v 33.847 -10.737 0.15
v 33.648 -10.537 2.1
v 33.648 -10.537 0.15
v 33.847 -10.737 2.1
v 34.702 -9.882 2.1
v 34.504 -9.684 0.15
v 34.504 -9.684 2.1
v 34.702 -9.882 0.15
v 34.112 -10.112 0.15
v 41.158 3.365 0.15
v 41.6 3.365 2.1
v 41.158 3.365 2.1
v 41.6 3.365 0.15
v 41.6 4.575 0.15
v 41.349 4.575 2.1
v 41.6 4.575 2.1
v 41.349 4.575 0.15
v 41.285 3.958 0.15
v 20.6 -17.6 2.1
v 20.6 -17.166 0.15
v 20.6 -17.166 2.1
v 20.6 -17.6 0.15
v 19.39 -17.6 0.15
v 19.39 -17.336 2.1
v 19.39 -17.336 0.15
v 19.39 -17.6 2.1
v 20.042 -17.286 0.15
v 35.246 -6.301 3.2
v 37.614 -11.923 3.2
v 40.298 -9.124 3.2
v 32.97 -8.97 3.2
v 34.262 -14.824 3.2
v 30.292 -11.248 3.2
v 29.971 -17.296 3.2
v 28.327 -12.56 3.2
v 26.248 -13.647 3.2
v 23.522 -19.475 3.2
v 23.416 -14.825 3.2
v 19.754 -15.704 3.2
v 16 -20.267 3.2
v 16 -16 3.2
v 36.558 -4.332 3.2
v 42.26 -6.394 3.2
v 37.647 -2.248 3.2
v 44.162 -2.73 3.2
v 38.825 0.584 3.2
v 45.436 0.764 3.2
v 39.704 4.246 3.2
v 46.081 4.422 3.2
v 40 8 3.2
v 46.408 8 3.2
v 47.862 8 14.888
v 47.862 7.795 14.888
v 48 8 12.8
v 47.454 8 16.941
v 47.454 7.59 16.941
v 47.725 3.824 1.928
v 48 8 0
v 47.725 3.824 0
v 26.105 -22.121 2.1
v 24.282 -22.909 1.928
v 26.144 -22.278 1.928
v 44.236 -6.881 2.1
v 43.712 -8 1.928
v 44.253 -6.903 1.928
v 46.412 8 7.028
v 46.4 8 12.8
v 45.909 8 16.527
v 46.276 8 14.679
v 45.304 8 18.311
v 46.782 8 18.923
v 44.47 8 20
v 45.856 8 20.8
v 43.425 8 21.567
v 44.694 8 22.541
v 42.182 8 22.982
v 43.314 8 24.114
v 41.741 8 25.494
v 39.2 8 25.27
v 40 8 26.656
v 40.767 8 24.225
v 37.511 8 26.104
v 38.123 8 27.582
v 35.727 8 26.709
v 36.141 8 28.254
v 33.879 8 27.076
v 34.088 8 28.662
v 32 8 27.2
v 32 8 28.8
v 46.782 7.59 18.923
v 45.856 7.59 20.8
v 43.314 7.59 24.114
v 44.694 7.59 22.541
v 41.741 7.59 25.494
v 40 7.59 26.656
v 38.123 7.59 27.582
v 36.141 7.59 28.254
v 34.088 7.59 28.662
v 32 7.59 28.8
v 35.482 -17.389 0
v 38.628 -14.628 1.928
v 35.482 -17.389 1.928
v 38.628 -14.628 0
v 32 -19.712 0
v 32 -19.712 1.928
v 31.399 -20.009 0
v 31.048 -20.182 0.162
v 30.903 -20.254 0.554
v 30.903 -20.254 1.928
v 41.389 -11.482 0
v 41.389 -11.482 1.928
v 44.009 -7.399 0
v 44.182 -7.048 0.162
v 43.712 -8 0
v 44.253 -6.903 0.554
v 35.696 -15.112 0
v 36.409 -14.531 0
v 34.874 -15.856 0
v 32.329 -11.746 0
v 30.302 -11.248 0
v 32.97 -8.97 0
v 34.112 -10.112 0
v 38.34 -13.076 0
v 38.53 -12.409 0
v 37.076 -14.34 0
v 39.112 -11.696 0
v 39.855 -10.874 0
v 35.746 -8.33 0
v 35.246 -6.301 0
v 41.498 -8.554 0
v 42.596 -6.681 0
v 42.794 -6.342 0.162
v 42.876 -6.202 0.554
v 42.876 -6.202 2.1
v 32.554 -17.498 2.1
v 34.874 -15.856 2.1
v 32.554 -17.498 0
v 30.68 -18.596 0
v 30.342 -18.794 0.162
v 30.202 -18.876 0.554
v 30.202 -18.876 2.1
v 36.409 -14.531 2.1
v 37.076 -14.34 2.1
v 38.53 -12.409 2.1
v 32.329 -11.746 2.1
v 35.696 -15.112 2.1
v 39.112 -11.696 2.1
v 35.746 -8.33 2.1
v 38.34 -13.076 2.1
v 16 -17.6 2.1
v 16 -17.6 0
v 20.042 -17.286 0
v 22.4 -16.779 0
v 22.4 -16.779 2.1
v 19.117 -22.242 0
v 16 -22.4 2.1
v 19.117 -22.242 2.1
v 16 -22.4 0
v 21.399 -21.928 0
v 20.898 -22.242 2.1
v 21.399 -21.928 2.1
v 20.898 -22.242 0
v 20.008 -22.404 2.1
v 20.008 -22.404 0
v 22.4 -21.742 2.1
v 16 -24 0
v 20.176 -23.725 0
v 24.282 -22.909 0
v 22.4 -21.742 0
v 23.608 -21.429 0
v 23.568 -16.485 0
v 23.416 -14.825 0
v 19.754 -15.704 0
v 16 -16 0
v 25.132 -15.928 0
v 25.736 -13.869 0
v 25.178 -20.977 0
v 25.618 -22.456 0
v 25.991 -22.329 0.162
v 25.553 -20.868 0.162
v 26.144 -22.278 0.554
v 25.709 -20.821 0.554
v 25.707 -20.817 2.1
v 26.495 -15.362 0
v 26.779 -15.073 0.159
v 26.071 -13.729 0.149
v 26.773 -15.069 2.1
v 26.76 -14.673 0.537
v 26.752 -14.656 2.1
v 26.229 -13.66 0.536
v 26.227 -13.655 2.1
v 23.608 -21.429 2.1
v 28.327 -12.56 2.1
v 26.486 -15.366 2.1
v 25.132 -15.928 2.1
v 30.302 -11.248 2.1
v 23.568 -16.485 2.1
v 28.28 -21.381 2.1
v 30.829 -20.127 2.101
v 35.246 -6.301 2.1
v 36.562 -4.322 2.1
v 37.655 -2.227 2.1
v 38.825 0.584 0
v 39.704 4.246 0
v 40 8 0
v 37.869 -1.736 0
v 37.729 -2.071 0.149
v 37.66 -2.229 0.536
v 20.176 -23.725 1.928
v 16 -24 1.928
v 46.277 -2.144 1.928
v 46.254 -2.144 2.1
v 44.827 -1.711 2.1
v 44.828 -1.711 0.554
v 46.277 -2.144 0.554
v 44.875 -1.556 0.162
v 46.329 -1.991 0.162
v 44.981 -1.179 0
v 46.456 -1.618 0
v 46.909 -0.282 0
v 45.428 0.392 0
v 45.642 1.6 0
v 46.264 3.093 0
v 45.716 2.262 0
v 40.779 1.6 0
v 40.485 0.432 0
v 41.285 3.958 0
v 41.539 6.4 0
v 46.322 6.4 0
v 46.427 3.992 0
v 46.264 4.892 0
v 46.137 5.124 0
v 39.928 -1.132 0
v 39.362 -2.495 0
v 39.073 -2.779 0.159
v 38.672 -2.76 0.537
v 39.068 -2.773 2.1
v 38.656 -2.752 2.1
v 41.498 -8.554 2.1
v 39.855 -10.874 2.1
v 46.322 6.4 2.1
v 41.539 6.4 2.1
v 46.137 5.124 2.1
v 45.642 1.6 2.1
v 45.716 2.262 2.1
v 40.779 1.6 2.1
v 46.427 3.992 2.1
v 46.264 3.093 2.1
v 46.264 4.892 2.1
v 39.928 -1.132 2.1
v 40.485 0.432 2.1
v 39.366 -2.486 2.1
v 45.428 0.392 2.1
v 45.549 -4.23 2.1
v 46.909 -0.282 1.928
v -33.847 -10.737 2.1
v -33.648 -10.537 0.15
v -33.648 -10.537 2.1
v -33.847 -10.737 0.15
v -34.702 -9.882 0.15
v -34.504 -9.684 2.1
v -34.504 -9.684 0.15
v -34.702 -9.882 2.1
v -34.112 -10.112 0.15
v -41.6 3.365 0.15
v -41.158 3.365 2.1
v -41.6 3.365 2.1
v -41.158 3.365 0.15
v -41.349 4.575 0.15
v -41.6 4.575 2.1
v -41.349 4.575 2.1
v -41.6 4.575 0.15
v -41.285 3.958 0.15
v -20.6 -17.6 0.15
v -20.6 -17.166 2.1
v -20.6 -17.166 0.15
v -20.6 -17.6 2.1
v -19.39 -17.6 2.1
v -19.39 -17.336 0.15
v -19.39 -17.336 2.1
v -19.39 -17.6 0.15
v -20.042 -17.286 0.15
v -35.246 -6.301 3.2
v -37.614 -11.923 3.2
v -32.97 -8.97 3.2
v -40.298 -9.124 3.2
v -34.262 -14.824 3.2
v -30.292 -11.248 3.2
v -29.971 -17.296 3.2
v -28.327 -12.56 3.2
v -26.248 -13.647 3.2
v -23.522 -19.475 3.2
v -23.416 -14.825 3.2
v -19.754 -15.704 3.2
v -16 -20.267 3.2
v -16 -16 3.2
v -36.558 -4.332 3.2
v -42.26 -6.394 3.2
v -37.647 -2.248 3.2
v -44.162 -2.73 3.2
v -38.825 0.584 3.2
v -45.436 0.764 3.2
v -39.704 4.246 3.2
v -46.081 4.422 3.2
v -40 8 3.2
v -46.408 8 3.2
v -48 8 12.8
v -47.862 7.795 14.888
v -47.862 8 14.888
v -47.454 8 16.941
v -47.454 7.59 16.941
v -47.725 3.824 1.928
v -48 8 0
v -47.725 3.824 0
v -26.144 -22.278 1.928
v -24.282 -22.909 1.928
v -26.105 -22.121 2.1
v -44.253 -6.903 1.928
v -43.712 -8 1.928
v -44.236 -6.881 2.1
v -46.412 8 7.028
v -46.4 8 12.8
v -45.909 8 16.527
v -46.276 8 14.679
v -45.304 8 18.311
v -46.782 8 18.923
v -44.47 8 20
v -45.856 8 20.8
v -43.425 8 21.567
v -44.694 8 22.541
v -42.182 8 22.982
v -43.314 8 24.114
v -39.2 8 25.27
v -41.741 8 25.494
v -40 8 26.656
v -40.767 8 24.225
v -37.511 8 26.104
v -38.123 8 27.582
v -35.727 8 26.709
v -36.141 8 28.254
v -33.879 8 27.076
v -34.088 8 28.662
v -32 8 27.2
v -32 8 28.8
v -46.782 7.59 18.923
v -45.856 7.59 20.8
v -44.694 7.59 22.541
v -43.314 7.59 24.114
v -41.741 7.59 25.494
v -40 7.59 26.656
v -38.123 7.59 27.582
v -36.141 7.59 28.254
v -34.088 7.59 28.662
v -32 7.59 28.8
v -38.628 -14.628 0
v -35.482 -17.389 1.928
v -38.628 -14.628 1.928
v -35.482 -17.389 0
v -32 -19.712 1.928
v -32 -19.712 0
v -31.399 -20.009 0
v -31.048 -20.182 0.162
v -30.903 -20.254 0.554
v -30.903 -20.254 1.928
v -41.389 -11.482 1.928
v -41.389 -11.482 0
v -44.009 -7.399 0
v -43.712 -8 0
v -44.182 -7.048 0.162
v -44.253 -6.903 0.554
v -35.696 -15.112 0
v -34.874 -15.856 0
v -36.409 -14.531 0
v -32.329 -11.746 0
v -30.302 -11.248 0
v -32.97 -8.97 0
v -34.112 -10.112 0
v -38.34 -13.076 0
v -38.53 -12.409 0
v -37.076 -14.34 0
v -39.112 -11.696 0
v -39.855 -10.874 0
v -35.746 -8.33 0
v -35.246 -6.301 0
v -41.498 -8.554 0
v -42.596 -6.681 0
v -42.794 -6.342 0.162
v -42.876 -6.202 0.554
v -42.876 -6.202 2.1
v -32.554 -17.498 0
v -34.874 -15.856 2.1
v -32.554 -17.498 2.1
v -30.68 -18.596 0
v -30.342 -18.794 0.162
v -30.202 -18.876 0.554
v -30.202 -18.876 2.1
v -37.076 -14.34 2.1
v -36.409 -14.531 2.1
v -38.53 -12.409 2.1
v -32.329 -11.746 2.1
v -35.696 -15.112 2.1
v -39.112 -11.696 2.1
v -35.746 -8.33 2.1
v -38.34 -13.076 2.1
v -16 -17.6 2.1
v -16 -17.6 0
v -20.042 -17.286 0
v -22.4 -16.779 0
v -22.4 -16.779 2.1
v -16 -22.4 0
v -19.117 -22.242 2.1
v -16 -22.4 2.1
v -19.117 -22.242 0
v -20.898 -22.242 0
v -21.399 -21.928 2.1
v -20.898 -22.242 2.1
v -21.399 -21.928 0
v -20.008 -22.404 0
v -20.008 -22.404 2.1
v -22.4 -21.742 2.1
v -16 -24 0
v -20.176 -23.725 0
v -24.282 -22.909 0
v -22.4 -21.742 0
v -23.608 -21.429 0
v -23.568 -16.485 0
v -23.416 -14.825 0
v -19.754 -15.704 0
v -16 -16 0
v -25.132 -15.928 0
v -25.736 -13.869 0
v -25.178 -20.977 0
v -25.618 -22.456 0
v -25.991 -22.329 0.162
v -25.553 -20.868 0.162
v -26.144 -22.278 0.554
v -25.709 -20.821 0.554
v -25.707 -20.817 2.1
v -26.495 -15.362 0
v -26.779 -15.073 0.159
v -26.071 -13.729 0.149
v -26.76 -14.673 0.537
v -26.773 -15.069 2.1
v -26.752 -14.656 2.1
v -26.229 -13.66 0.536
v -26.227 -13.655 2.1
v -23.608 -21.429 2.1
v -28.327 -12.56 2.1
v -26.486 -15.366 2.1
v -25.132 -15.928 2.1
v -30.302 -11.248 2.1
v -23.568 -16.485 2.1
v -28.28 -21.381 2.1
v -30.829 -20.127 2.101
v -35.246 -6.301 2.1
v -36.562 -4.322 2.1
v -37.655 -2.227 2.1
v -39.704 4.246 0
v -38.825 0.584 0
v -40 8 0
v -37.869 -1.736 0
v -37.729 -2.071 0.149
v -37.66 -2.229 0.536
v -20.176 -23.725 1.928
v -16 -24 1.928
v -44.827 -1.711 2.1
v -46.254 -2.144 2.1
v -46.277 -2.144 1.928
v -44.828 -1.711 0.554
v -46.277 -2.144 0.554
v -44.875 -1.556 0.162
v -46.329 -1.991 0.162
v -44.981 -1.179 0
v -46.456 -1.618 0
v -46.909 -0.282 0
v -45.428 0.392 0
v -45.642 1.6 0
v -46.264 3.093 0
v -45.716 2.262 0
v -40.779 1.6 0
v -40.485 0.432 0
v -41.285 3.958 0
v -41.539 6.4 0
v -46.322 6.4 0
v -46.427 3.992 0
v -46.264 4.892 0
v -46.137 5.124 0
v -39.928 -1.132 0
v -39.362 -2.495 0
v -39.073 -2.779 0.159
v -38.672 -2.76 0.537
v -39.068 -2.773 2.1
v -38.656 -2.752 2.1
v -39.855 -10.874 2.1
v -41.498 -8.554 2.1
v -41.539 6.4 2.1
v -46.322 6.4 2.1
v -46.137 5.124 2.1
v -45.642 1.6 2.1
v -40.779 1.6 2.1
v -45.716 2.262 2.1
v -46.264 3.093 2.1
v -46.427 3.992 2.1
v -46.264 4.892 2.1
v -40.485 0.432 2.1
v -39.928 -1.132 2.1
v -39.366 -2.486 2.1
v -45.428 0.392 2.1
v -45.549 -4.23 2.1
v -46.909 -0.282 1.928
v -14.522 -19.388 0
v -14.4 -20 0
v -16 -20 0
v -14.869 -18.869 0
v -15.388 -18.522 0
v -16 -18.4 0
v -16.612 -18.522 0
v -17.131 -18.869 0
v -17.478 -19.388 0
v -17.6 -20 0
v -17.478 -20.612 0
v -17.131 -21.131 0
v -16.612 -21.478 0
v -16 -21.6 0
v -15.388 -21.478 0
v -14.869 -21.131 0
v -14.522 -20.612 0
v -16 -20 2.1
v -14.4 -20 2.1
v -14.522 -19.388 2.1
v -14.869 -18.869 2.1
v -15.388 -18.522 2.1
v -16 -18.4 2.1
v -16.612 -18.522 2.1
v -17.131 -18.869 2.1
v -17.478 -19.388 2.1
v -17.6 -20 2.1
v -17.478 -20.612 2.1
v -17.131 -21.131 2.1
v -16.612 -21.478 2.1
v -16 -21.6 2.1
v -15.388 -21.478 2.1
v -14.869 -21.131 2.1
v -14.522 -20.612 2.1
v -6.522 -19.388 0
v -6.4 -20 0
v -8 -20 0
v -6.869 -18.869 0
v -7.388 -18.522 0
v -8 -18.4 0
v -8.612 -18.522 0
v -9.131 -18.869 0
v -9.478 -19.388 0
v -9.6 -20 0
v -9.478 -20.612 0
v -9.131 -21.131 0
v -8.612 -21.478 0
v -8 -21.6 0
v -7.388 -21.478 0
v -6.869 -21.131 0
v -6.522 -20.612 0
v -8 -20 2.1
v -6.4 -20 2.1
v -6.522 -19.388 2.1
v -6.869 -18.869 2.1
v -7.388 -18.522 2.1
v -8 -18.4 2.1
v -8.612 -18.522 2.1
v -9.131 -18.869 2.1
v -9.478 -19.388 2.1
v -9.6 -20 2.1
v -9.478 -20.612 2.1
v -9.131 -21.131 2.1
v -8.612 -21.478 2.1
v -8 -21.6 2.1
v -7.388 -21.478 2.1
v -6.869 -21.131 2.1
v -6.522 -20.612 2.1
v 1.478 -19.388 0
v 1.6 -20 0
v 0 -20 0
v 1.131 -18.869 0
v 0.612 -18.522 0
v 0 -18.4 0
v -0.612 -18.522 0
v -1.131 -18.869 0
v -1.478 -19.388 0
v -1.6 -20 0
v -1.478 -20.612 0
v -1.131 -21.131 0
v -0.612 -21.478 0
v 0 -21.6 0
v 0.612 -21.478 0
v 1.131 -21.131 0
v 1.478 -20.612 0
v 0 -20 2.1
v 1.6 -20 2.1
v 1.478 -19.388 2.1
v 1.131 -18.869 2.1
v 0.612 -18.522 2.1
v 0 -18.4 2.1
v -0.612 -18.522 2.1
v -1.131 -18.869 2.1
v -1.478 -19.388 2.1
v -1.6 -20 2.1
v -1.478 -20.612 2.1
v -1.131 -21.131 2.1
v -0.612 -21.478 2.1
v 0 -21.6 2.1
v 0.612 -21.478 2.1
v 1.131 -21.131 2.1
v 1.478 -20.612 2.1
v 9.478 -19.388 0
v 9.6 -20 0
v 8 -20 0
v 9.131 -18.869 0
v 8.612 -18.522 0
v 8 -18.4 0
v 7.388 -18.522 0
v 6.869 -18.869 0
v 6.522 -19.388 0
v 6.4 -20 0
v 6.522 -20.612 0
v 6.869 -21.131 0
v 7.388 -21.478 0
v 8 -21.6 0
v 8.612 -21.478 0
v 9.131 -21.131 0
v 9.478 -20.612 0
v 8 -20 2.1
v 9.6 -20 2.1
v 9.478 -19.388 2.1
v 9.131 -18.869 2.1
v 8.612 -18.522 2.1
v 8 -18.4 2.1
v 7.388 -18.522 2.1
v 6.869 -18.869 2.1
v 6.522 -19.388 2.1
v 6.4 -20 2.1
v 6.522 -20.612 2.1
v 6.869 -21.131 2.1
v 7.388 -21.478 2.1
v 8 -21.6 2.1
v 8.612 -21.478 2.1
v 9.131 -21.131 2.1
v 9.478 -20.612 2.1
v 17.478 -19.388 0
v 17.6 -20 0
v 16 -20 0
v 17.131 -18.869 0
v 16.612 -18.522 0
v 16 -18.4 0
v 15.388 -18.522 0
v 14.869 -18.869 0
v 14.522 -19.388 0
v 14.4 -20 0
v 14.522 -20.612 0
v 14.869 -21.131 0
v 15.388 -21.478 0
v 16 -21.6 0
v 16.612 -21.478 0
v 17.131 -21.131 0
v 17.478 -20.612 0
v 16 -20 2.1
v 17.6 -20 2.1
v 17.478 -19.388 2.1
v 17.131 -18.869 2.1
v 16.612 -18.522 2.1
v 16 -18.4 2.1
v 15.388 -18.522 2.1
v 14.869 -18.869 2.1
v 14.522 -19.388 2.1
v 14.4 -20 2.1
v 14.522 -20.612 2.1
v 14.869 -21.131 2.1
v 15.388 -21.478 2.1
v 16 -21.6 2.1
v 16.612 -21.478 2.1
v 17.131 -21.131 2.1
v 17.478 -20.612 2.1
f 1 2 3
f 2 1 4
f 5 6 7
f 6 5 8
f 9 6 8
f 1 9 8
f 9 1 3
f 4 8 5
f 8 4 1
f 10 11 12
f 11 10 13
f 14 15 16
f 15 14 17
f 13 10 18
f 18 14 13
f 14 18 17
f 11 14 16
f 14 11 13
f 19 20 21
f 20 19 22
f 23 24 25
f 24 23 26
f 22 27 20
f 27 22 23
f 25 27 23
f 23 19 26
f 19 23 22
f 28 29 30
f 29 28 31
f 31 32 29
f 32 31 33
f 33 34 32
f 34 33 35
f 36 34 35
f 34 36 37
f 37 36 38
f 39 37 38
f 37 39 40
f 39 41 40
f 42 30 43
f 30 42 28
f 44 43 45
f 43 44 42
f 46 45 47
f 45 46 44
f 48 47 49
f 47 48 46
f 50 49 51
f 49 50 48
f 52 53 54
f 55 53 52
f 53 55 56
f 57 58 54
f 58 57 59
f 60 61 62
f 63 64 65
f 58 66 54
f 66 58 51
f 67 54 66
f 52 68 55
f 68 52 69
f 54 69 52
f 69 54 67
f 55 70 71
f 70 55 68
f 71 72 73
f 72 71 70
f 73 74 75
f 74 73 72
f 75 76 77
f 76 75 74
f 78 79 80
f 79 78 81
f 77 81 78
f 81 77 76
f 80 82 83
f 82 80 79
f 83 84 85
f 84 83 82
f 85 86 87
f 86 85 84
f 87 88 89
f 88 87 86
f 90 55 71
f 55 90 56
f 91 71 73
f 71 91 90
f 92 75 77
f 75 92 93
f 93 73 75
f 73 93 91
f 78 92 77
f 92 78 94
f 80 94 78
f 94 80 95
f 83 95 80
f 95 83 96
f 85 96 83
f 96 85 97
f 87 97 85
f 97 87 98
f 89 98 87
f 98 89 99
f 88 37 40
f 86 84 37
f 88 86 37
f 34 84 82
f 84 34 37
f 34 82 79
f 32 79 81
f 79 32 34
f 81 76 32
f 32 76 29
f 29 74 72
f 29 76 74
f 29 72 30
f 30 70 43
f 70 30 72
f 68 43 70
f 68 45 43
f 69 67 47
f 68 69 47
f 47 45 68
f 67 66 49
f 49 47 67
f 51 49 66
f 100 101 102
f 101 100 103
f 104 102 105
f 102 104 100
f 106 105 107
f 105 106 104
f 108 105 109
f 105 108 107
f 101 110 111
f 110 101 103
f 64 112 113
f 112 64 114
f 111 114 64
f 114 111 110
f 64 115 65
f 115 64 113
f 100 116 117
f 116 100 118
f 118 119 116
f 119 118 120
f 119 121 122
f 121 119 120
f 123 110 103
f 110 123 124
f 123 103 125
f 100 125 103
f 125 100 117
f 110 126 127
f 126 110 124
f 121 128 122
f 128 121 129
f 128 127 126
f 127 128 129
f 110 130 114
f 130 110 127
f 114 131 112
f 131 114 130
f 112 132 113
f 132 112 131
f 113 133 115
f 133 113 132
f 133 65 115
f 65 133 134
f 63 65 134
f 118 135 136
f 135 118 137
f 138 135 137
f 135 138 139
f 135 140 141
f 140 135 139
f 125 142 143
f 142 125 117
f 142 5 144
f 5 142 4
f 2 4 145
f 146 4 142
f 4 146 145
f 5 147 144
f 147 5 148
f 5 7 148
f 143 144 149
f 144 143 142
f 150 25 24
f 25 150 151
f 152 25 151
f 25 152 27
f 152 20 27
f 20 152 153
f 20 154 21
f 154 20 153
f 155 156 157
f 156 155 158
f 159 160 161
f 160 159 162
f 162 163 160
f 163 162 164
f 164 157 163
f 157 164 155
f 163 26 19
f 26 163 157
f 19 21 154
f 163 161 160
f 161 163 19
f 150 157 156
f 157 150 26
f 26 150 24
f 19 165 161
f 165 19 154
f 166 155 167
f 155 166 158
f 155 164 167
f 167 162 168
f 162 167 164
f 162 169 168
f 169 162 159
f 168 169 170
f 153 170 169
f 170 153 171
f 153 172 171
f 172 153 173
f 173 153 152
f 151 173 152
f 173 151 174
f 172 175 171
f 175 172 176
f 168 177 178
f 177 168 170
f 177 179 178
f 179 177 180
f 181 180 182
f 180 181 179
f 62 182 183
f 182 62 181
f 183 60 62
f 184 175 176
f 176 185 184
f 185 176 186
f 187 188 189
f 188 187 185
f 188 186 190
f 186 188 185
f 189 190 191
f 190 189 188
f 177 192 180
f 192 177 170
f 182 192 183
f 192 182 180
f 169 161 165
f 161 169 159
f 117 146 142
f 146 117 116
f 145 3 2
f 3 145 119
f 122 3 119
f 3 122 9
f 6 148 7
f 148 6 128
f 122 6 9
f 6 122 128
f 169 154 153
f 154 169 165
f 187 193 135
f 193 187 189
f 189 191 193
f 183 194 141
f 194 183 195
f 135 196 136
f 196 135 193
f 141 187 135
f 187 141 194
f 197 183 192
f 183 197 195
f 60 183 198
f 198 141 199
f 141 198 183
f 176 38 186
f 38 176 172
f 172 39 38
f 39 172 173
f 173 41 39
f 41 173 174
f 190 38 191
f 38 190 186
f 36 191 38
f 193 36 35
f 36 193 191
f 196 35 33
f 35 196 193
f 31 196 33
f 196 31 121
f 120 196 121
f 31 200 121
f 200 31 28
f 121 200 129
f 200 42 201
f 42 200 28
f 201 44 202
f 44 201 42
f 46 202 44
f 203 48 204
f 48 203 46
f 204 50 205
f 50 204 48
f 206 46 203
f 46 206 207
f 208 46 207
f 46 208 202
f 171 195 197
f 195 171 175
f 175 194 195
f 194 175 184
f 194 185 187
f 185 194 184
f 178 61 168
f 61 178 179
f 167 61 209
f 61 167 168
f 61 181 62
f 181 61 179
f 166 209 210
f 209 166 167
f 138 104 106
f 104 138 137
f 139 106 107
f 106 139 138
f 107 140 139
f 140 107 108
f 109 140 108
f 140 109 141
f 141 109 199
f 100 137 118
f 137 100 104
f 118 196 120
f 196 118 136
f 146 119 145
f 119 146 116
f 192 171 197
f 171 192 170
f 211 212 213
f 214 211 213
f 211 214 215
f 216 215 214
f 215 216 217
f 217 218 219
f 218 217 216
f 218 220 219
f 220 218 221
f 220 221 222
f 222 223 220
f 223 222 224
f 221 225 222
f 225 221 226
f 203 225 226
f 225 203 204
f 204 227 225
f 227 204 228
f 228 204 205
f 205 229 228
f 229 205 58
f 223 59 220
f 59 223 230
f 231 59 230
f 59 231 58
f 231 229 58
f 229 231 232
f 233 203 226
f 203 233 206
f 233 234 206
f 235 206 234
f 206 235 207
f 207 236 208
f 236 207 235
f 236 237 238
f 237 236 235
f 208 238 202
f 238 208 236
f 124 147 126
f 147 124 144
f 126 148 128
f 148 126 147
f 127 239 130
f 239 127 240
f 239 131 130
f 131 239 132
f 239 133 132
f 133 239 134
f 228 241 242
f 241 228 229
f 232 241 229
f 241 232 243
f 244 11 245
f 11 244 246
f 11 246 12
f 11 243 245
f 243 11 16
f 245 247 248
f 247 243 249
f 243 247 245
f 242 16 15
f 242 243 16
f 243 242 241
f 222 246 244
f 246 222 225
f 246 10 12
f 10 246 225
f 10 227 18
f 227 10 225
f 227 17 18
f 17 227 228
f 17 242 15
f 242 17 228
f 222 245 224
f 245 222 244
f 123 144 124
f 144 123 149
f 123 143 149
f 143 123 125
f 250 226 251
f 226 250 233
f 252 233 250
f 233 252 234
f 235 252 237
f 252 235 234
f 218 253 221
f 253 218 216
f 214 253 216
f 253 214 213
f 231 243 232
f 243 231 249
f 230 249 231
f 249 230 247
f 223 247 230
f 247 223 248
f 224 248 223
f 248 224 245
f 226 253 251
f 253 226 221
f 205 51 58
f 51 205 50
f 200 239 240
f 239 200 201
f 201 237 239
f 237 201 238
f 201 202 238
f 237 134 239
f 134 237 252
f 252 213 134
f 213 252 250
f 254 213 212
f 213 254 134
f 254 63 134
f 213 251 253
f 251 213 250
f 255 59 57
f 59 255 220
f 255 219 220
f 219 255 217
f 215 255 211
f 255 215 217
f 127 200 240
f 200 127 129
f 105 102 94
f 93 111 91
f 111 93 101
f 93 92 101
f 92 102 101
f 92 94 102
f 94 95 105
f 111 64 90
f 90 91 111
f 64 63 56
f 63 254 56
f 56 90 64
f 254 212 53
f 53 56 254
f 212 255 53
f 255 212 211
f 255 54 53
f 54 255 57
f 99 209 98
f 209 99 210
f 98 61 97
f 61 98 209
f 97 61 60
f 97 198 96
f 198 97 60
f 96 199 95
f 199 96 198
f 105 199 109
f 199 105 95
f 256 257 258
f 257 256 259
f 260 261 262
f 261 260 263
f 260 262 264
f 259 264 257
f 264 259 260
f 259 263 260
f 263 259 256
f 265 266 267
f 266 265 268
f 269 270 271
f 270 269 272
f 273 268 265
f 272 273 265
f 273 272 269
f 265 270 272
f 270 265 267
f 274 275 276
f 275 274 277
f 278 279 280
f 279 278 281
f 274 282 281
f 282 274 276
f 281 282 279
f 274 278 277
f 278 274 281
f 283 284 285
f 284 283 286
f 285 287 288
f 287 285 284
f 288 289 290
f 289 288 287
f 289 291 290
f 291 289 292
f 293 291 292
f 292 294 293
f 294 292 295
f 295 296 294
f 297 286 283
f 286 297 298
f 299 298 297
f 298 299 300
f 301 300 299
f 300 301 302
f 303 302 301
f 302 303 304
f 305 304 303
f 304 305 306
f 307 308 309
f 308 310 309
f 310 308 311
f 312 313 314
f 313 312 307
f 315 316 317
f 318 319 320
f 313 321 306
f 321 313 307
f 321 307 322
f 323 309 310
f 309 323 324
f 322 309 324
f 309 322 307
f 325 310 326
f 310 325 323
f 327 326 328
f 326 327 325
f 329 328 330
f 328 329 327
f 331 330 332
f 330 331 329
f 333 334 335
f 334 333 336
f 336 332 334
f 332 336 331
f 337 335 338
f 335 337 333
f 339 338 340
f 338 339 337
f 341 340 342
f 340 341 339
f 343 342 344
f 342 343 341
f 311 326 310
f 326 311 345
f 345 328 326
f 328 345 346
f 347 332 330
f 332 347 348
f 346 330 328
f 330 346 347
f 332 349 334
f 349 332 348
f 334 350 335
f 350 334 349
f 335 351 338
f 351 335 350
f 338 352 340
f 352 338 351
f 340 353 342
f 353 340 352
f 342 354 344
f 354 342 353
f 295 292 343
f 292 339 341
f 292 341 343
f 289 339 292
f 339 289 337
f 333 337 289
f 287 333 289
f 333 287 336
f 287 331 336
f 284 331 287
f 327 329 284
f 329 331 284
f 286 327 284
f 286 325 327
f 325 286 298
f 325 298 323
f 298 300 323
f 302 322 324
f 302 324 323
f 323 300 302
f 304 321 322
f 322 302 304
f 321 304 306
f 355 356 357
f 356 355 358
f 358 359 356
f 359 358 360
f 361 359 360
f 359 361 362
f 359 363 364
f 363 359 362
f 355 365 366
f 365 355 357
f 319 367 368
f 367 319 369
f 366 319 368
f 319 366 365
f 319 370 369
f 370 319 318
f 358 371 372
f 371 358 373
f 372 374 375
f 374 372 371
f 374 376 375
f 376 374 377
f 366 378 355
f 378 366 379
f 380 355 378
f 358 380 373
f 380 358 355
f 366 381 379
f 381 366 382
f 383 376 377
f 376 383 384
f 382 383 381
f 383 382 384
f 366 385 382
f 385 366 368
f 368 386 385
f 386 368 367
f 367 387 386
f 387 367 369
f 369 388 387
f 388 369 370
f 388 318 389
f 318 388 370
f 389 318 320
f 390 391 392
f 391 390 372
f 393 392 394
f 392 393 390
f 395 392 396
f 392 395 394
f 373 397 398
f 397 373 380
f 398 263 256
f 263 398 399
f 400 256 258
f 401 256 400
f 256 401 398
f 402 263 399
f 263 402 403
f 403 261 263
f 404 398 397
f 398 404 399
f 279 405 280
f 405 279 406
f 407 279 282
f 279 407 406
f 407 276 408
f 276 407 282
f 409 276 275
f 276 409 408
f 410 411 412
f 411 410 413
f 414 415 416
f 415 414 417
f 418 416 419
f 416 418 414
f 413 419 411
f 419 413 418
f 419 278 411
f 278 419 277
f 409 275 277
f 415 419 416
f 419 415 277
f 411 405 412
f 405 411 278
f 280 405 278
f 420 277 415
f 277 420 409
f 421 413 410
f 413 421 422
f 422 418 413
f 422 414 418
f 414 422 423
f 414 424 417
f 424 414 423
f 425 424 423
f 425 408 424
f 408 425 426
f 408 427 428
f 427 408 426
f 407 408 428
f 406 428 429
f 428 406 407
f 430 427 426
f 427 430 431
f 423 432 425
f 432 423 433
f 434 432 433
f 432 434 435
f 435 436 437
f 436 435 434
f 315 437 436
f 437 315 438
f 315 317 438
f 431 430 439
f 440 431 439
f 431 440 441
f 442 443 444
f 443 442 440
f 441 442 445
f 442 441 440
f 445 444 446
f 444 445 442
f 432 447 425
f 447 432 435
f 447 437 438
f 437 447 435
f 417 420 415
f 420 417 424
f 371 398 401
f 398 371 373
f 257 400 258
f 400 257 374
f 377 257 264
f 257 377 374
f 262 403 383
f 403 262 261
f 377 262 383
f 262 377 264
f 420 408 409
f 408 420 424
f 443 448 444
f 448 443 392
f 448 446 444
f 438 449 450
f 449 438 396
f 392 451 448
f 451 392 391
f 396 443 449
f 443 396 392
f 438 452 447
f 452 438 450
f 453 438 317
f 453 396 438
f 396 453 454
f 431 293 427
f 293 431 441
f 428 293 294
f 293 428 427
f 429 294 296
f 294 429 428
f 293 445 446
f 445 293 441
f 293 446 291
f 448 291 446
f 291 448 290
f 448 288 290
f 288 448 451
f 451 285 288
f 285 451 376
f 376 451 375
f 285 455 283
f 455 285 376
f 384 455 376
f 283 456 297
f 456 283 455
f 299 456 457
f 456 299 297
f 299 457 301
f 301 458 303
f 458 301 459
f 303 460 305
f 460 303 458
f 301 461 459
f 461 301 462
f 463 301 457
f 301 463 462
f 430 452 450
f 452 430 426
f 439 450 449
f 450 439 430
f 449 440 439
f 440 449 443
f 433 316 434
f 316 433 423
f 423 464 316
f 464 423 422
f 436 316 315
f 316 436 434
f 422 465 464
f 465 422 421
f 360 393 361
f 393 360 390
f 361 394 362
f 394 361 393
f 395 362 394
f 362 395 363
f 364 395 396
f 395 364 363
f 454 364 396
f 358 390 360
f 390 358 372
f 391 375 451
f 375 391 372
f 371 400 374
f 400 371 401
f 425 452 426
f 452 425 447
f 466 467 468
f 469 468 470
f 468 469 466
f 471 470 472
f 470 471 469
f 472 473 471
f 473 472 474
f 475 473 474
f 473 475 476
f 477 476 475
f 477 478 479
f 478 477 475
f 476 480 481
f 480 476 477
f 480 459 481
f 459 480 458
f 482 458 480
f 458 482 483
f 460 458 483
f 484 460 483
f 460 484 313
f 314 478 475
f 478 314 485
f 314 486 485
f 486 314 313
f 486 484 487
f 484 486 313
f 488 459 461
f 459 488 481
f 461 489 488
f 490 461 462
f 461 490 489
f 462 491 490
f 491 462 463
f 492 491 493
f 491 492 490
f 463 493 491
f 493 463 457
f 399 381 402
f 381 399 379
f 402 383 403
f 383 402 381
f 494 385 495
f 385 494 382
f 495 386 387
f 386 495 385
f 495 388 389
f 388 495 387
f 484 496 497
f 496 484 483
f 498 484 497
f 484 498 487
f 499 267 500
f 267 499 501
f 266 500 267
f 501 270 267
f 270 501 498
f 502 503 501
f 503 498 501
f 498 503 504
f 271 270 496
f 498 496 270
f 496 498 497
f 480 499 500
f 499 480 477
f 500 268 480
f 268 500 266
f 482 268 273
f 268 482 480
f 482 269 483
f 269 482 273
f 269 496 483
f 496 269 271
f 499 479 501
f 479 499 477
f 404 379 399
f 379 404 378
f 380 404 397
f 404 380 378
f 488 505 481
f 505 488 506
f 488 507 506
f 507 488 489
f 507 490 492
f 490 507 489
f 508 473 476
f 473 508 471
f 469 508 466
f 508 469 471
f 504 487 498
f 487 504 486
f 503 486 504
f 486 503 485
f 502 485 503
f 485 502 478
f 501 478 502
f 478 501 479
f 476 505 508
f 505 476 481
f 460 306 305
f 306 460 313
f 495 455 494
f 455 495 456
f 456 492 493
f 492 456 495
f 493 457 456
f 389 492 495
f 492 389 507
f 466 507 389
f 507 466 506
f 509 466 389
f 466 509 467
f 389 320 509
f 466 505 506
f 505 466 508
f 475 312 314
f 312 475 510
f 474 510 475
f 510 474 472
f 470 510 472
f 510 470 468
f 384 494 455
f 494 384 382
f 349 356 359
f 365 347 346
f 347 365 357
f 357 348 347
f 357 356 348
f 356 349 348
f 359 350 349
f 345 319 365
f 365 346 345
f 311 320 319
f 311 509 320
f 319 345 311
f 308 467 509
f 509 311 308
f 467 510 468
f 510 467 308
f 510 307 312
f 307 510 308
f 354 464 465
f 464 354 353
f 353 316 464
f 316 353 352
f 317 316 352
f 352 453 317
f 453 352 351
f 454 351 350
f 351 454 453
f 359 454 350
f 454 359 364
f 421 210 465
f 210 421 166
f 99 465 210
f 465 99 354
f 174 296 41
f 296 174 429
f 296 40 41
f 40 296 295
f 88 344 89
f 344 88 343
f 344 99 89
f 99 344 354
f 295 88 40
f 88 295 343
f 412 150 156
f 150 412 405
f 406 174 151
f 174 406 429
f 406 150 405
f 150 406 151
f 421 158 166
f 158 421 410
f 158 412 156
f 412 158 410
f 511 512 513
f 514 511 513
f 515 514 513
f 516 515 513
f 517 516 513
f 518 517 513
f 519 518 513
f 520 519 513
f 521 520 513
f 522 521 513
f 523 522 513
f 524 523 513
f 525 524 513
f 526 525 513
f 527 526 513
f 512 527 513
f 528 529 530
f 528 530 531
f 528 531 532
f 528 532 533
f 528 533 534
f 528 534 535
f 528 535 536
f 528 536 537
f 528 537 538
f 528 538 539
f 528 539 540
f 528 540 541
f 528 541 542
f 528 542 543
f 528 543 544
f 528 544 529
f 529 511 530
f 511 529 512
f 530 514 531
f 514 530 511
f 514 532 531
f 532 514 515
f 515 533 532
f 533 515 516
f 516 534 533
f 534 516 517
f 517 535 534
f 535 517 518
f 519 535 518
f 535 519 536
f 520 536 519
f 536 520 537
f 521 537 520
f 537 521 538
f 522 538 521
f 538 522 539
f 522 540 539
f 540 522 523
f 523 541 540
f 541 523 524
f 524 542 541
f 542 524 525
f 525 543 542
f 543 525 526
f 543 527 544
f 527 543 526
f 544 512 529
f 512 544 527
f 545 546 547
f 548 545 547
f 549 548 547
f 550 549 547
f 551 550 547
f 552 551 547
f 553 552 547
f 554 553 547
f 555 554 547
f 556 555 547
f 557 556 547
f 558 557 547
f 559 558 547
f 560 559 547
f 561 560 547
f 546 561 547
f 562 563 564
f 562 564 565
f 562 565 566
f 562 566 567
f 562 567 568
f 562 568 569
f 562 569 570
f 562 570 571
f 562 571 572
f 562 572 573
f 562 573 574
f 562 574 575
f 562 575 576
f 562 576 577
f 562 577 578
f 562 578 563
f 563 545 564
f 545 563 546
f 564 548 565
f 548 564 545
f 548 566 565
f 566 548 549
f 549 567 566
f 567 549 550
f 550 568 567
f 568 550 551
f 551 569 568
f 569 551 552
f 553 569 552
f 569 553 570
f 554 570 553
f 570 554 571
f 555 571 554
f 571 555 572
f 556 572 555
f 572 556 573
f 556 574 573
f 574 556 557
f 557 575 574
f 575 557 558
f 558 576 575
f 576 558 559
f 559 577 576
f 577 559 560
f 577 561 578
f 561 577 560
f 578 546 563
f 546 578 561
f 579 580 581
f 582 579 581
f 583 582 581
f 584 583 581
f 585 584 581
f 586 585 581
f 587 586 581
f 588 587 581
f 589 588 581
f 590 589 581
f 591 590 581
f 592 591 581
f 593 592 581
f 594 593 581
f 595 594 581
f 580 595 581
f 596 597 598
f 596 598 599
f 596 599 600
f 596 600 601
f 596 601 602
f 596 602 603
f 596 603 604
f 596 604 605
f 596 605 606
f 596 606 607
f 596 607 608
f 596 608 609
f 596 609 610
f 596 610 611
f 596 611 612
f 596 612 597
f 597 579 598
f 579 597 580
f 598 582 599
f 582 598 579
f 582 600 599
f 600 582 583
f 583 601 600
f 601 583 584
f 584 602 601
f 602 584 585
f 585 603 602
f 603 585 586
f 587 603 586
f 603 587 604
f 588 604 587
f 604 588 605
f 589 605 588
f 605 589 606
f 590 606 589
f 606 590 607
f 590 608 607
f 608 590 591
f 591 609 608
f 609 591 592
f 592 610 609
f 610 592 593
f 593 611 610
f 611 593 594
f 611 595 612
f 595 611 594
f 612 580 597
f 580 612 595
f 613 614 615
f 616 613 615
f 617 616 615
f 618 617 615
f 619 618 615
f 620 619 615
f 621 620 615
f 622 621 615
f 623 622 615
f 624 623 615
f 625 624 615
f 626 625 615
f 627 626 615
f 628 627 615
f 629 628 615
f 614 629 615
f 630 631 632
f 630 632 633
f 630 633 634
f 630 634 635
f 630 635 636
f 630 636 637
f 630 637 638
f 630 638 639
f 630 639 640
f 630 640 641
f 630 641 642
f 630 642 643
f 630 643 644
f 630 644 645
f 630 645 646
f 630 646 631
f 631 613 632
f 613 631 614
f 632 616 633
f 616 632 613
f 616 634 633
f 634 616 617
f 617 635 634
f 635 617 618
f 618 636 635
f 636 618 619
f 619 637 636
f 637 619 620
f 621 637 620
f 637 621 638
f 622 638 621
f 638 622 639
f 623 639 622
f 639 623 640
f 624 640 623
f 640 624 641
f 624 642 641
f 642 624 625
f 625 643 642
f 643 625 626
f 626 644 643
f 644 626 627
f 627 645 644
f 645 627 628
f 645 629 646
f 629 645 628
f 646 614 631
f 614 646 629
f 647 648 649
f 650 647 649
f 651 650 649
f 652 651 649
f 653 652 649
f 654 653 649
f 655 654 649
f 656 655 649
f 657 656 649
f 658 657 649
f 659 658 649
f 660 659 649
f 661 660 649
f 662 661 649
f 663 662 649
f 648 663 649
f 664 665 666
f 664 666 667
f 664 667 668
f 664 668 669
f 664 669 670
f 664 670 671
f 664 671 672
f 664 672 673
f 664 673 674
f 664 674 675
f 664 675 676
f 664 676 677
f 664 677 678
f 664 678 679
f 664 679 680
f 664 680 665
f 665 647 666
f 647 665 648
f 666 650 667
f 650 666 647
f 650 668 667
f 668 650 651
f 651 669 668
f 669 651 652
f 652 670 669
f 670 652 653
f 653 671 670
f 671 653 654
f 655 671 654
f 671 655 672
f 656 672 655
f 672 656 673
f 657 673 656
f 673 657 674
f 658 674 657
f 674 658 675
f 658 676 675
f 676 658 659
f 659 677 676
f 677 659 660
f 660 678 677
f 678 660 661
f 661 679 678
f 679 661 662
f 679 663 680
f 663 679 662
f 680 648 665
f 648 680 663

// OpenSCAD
use <../lib.scad>
use <../p/box2-11.scad>
use <../p/box2-9p.scad>
use <../p/rect2p.scad>
use <s/3571s01.scad>
use <../p/stug3-1x5.scad>
function ldraw_lib__3571() = [
// 0 Windscreen  4 x 12 x  3 Curved
// 0 Name: 3571.dat
// 0 Author: Magnus Forsberg [MagFors]
// 0 !LDRAW_ORG Part UPDATE 2026-01
// 0 !LICENSE Licensed under CC BY 4.0 : see CAreadme.txt
// 
// 0 BFC CERTIFY CCW
  [0,"BFC","CERTIFY"],
  [0,"BFC","CCW"],
// 
// 0 !KEYWORDS Brickowl 287871
// 
// 0 !HISTORY 2023-08-23 {LEGO Instructions App} Original part shape
// 0 !HISTORY 2023-08-30 [MagFors] File preparation for LDraw Parts Tracker
// 0 !HISTORY 2026-01-29 [OrionP] Official Update 2026-01
// 
// 1 16 0 0 0 1 0 0 0 1 0 0 0 1 s\3571s01.dat
  [1,16,0,0,0,1,0,0,0,1,0,0,0,1, ldraw_lib__s__3571s01()],
// 1 16 0 0 0 -1 0 0 0 1 0 0 0 1 s\3571s01.dat
  [1,16,0,0,0,-1,0,0,0,1,0,0,0,1, ldraw_lib__s__3571s01()],
// 
// 0 // front side
// 1 16 0 -2.4105 -60 40 0 0 0 0 -2.4105 0 1 0 rect2p.dat
  [1,16,0,-2.4105,-60,40,0,0,0,0,-2.4105,0,1,0, ldraw_lib__rect2p()],
// 4 16 80 -72 18.975 -80 -72 18.975 -40 -4.821 -60 40 -4.821 -60
  [4,16,80,-72,18.975,-80,-72,18.975,-40,-4.821,-60,40,-4.821,-60],
// 
// 0 // back side
// 1 16 0 -4 -45.3335 40 0 0 0 0 -4 0 5.3335 0 box2-9p.dat
  [1,16,0,-4,-45.3335,40,0,0,0,0,-4,0,5.3335,0, ldraw_lib__box2_9p()],
// 1 16 0 -70 19.4875 80 0 0 0 0 -2 0 .5125 0 box2-9p.dat
  [1,16,0,-70,19.4875,80,0,0,0,0,-2,0,.5125,0, ldraw_lib__box2_9p()],
// 4 16 -80 -68 20 80 -68 20 40 -8 -50.667 -40 -8 -50.667
  [4,16,-80,-68,20,80,-68,20,40,-8,-50.667,-40,-8,-50.667],
// 1 16 0 -5.25 -50 40 0 0 0 -1 0 0 0 -6 rect2p.dat
  [1,16,0,-5.25,-50,40,0,0,0,-1,0,0,0,-6, ldraw_lib__rect2p()],
// 1 16 0 -2.625 -42 -40 0 0 0 2.625 0 0 0 -2 box2-11.dat
  [1,16,0,-2.625,-42,-40,0,0,0,2.625,0,0,0,-2, ldraw_lib__box2_11()],
// 1 16 0 -2.625 -58 -40 0 0 0 2.625 0 0 0 2 box2-11.dat
  [1,16,0,-2.625,-58,-40,0,0,0,2.625,0,0,0,2, ldraw_lib__box2_11()],
// 1 16 0 -5.25 -50 1 0 0 0 -1.3125 0 0 0 1 stug3-1x5.dat
  [1,16,0,-5.25,-50,1,0,0,0,-1.3125,0,0,0,1, ldraw_lib__stug3_1x5()],
];
module ldraw_lib__3571(step=0, col=false, unit=2/5, alt=false, line=0.2, solid=!$preview)
    makepoly(ldraw_lib__3571(), step=step, col=col, unit=unit, alt=alt, line=line, solid=solid);
ldraw_lib__3571(line=0.2);
